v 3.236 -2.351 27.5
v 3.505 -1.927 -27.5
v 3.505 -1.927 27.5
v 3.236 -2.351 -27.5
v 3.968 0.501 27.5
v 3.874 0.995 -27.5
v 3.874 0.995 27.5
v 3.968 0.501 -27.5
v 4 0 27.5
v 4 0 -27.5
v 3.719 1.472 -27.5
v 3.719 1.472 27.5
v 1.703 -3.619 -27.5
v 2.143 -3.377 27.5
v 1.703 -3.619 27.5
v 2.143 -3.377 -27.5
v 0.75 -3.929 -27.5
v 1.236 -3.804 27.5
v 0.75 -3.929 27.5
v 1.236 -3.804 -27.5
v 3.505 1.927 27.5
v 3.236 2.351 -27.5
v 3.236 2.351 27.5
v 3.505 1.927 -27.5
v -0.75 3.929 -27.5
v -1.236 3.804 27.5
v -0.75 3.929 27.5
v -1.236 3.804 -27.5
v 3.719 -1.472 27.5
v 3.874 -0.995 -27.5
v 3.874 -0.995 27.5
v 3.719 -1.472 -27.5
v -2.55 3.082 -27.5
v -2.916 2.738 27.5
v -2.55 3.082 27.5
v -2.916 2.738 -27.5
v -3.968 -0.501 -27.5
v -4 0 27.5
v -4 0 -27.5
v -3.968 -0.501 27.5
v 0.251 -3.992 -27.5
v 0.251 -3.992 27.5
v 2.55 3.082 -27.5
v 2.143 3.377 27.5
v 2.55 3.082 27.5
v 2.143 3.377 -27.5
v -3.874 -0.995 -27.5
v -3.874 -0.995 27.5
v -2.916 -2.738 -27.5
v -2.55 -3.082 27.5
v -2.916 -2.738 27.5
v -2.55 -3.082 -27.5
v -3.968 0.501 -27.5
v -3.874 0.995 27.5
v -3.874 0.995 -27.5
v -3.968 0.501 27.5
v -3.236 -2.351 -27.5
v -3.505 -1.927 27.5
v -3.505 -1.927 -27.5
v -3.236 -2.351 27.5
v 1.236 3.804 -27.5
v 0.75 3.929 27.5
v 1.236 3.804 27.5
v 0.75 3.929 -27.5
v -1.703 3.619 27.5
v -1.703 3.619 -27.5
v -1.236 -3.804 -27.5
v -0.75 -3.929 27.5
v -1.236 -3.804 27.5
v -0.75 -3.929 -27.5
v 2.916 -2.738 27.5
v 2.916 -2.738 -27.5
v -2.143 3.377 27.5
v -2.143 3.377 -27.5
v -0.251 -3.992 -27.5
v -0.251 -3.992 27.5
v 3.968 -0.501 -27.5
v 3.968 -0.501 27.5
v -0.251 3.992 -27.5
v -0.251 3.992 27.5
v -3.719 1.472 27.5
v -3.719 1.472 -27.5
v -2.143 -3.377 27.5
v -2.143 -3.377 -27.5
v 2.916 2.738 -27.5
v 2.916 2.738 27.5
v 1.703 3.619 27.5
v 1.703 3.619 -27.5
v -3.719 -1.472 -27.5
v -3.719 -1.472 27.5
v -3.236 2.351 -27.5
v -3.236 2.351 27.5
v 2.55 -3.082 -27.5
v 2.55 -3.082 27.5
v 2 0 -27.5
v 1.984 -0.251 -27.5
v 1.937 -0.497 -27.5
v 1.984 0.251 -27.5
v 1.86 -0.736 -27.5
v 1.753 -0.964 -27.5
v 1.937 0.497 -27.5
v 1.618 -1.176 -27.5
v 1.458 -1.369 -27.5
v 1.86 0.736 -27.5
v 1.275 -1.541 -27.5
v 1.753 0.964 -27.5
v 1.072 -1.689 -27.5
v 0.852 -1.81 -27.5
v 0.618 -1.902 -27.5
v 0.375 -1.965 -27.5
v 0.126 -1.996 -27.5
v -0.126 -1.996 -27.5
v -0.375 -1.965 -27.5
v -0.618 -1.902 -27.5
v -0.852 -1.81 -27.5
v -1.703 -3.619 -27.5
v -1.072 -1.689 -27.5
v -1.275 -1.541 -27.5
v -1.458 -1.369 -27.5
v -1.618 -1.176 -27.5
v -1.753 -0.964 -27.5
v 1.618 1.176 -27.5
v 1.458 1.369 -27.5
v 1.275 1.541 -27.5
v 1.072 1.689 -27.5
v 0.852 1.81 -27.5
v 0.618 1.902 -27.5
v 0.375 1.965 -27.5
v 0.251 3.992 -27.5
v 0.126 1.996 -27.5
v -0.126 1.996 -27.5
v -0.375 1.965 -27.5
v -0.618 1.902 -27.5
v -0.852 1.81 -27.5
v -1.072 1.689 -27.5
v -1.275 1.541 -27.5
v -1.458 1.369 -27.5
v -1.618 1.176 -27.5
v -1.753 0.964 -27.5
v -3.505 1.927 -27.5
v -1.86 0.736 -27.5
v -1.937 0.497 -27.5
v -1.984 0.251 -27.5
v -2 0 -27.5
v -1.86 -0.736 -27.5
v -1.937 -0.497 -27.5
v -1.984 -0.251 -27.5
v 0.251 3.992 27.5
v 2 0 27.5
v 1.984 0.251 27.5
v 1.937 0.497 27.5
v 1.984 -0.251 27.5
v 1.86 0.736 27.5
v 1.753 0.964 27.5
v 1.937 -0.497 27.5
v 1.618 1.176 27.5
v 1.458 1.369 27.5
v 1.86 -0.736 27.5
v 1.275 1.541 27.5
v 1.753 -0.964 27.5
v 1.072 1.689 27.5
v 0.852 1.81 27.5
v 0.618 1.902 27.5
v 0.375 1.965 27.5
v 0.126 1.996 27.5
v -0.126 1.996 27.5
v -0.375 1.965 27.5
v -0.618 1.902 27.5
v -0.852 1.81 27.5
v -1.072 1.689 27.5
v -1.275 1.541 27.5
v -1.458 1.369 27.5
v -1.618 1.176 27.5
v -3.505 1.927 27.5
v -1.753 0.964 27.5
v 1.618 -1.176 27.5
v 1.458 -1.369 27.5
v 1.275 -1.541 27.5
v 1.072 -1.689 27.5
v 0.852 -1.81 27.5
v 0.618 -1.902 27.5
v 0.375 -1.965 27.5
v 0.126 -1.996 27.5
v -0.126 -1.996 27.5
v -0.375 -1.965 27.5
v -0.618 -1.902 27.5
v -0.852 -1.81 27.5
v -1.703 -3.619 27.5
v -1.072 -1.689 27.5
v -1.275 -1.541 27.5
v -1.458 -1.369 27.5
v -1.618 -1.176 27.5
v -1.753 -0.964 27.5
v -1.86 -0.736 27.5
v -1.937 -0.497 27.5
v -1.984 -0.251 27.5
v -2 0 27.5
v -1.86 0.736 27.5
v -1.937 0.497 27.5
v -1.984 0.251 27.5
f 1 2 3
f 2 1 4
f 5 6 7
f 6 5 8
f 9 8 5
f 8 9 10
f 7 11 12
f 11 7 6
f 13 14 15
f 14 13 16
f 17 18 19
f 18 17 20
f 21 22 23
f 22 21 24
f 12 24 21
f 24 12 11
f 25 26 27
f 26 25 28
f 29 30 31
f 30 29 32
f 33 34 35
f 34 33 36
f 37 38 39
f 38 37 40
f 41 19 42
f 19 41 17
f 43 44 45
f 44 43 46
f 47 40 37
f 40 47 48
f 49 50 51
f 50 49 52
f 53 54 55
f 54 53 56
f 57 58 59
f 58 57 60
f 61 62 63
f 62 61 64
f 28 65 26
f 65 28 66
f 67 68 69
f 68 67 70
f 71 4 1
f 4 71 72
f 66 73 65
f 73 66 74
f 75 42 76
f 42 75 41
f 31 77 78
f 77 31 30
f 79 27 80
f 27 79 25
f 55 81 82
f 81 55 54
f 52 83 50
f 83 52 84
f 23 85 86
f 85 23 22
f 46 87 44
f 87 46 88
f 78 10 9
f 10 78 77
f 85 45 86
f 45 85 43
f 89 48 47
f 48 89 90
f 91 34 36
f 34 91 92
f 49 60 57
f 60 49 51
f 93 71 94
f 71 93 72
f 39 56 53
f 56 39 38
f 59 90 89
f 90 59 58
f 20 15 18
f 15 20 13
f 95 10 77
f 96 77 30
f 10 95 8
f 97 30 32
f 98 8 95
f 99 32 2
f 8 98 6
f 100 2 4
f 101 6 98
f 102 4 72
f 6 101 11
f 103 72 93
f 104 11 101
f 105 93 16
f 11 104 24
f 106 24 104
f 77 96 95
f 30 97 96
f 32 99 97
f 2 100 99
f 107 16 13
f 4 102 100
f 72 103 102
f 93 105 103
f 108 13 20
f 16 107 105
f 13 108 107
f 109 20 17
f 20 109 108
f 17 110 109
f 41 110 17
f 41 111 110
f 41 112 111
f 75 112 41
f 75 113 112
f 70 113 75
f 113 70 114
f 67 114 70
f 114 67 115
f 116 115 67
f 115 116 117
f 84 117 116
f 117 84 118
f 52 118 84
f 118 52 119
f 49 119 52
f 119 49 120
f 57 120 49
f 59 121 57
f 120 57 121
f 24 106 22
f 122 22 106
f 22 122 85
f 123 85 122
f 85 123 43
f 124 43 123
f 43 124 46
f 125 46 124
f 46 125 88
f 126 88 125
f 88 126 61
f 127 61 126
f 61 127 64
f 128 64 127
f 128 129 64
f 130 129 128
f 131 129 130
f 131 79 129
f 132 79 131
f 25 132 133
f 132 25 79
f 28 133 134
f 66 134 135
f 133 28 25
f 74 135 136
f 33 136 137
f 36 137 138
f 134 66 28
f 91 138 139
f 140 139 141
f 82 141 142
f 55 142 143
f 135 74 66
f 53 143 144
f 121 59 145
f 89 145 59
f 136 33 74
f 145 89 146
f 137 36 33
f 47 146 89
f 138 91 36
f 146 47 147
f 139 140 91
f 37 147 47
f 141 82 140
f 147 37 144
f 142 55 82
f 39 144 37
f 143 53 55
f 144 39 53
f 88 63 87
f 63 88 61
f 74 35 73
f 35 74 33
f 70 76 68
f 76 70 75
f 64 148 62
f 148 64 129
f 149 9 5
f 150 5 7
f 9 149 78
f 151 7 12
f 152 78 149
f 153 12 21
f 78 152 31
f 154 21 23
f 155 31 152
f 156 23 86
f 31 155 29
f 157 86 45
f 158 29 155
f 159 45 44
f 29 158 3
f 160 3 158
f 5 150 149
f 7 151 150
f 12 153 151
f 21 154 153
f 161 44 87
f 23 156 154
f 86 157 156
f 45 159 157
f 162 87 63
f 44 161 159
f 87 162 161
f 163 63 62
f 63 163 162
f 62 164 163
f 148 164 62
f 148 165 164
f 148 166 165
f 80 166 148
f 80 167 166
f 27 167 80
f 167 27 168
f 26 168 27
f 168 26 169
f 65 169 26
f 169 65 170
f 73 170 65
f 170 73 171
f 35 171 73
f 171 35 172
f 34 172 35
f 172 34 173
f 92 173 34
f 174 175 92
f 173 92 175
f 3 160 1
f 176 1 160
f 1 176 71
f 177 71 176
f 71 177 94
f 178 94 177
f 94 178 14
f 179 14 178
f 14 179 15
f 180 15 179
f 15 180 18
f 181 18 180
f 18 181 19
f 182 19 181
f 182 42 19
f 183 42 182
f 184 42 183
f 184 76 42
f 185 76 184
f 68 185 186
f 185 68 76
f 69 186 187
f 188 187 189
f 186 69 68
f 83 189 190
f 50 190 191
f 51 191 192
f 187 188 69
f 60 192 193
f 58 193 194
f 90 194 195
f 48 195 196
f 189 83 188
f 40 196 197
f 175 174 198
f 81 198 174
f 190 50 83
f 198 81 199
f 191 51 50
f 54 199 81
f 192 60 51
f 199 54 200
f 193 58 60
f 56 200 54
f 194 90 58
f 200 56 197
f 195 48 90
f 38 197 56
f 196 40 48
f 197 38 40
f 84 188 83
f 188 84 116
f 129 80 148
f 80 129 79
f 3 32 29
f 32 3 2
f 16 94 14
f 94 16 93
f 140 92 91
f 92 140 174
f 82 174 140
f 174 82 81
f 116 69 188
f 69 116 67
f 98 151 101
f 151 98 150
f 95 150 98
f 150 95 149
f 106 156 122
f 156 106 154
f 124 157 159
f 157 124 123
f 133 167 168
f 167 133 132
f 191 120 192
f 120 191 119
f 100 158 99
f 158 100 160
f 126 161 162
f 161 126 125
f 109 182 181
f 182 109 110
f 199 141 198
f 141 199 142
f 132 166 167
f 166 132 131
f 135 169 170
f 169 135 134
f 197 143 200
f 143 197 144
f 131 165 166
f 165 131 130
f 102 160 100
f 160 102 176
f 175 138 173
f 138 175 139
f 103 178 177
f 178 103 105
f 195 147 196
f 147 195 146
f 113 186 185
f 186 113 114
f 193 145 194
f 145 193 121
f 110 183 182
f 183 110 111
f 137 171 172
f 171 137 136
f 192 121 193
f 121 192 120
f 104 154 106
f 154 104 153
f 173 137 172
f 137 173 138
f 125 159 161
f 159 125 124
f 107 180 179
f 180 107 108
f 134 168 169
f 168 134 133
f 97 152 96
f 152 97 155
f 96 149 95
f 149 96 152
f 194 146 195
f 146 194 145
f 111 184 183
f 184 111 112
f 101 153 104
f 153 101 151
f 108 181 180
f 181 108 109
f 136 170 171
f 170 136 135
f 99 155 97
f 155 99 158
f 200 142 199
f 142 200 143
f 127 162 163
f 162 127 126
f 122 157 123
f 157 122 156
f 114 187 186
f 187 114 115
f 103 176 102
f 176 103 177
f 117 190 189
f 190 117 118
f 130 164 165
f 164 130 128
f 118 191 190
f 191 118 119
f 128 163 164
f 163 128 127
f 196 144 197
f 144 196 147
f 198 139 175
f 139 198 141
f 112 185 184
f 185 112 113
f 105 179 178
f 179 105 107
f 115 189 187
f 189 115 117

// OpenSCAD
$fn = 50;


difference() {
	union() {
		translate(v = [0, 0, -27.5000000000]) {
			cylinder(h = 55, r = 4.0000000000);
		}
	}
	union() {
		translate(v = [0, 0, -100.0000000000]) {
			cylinder(h = 200, r = 2.0000000000);
		}
	}
}
